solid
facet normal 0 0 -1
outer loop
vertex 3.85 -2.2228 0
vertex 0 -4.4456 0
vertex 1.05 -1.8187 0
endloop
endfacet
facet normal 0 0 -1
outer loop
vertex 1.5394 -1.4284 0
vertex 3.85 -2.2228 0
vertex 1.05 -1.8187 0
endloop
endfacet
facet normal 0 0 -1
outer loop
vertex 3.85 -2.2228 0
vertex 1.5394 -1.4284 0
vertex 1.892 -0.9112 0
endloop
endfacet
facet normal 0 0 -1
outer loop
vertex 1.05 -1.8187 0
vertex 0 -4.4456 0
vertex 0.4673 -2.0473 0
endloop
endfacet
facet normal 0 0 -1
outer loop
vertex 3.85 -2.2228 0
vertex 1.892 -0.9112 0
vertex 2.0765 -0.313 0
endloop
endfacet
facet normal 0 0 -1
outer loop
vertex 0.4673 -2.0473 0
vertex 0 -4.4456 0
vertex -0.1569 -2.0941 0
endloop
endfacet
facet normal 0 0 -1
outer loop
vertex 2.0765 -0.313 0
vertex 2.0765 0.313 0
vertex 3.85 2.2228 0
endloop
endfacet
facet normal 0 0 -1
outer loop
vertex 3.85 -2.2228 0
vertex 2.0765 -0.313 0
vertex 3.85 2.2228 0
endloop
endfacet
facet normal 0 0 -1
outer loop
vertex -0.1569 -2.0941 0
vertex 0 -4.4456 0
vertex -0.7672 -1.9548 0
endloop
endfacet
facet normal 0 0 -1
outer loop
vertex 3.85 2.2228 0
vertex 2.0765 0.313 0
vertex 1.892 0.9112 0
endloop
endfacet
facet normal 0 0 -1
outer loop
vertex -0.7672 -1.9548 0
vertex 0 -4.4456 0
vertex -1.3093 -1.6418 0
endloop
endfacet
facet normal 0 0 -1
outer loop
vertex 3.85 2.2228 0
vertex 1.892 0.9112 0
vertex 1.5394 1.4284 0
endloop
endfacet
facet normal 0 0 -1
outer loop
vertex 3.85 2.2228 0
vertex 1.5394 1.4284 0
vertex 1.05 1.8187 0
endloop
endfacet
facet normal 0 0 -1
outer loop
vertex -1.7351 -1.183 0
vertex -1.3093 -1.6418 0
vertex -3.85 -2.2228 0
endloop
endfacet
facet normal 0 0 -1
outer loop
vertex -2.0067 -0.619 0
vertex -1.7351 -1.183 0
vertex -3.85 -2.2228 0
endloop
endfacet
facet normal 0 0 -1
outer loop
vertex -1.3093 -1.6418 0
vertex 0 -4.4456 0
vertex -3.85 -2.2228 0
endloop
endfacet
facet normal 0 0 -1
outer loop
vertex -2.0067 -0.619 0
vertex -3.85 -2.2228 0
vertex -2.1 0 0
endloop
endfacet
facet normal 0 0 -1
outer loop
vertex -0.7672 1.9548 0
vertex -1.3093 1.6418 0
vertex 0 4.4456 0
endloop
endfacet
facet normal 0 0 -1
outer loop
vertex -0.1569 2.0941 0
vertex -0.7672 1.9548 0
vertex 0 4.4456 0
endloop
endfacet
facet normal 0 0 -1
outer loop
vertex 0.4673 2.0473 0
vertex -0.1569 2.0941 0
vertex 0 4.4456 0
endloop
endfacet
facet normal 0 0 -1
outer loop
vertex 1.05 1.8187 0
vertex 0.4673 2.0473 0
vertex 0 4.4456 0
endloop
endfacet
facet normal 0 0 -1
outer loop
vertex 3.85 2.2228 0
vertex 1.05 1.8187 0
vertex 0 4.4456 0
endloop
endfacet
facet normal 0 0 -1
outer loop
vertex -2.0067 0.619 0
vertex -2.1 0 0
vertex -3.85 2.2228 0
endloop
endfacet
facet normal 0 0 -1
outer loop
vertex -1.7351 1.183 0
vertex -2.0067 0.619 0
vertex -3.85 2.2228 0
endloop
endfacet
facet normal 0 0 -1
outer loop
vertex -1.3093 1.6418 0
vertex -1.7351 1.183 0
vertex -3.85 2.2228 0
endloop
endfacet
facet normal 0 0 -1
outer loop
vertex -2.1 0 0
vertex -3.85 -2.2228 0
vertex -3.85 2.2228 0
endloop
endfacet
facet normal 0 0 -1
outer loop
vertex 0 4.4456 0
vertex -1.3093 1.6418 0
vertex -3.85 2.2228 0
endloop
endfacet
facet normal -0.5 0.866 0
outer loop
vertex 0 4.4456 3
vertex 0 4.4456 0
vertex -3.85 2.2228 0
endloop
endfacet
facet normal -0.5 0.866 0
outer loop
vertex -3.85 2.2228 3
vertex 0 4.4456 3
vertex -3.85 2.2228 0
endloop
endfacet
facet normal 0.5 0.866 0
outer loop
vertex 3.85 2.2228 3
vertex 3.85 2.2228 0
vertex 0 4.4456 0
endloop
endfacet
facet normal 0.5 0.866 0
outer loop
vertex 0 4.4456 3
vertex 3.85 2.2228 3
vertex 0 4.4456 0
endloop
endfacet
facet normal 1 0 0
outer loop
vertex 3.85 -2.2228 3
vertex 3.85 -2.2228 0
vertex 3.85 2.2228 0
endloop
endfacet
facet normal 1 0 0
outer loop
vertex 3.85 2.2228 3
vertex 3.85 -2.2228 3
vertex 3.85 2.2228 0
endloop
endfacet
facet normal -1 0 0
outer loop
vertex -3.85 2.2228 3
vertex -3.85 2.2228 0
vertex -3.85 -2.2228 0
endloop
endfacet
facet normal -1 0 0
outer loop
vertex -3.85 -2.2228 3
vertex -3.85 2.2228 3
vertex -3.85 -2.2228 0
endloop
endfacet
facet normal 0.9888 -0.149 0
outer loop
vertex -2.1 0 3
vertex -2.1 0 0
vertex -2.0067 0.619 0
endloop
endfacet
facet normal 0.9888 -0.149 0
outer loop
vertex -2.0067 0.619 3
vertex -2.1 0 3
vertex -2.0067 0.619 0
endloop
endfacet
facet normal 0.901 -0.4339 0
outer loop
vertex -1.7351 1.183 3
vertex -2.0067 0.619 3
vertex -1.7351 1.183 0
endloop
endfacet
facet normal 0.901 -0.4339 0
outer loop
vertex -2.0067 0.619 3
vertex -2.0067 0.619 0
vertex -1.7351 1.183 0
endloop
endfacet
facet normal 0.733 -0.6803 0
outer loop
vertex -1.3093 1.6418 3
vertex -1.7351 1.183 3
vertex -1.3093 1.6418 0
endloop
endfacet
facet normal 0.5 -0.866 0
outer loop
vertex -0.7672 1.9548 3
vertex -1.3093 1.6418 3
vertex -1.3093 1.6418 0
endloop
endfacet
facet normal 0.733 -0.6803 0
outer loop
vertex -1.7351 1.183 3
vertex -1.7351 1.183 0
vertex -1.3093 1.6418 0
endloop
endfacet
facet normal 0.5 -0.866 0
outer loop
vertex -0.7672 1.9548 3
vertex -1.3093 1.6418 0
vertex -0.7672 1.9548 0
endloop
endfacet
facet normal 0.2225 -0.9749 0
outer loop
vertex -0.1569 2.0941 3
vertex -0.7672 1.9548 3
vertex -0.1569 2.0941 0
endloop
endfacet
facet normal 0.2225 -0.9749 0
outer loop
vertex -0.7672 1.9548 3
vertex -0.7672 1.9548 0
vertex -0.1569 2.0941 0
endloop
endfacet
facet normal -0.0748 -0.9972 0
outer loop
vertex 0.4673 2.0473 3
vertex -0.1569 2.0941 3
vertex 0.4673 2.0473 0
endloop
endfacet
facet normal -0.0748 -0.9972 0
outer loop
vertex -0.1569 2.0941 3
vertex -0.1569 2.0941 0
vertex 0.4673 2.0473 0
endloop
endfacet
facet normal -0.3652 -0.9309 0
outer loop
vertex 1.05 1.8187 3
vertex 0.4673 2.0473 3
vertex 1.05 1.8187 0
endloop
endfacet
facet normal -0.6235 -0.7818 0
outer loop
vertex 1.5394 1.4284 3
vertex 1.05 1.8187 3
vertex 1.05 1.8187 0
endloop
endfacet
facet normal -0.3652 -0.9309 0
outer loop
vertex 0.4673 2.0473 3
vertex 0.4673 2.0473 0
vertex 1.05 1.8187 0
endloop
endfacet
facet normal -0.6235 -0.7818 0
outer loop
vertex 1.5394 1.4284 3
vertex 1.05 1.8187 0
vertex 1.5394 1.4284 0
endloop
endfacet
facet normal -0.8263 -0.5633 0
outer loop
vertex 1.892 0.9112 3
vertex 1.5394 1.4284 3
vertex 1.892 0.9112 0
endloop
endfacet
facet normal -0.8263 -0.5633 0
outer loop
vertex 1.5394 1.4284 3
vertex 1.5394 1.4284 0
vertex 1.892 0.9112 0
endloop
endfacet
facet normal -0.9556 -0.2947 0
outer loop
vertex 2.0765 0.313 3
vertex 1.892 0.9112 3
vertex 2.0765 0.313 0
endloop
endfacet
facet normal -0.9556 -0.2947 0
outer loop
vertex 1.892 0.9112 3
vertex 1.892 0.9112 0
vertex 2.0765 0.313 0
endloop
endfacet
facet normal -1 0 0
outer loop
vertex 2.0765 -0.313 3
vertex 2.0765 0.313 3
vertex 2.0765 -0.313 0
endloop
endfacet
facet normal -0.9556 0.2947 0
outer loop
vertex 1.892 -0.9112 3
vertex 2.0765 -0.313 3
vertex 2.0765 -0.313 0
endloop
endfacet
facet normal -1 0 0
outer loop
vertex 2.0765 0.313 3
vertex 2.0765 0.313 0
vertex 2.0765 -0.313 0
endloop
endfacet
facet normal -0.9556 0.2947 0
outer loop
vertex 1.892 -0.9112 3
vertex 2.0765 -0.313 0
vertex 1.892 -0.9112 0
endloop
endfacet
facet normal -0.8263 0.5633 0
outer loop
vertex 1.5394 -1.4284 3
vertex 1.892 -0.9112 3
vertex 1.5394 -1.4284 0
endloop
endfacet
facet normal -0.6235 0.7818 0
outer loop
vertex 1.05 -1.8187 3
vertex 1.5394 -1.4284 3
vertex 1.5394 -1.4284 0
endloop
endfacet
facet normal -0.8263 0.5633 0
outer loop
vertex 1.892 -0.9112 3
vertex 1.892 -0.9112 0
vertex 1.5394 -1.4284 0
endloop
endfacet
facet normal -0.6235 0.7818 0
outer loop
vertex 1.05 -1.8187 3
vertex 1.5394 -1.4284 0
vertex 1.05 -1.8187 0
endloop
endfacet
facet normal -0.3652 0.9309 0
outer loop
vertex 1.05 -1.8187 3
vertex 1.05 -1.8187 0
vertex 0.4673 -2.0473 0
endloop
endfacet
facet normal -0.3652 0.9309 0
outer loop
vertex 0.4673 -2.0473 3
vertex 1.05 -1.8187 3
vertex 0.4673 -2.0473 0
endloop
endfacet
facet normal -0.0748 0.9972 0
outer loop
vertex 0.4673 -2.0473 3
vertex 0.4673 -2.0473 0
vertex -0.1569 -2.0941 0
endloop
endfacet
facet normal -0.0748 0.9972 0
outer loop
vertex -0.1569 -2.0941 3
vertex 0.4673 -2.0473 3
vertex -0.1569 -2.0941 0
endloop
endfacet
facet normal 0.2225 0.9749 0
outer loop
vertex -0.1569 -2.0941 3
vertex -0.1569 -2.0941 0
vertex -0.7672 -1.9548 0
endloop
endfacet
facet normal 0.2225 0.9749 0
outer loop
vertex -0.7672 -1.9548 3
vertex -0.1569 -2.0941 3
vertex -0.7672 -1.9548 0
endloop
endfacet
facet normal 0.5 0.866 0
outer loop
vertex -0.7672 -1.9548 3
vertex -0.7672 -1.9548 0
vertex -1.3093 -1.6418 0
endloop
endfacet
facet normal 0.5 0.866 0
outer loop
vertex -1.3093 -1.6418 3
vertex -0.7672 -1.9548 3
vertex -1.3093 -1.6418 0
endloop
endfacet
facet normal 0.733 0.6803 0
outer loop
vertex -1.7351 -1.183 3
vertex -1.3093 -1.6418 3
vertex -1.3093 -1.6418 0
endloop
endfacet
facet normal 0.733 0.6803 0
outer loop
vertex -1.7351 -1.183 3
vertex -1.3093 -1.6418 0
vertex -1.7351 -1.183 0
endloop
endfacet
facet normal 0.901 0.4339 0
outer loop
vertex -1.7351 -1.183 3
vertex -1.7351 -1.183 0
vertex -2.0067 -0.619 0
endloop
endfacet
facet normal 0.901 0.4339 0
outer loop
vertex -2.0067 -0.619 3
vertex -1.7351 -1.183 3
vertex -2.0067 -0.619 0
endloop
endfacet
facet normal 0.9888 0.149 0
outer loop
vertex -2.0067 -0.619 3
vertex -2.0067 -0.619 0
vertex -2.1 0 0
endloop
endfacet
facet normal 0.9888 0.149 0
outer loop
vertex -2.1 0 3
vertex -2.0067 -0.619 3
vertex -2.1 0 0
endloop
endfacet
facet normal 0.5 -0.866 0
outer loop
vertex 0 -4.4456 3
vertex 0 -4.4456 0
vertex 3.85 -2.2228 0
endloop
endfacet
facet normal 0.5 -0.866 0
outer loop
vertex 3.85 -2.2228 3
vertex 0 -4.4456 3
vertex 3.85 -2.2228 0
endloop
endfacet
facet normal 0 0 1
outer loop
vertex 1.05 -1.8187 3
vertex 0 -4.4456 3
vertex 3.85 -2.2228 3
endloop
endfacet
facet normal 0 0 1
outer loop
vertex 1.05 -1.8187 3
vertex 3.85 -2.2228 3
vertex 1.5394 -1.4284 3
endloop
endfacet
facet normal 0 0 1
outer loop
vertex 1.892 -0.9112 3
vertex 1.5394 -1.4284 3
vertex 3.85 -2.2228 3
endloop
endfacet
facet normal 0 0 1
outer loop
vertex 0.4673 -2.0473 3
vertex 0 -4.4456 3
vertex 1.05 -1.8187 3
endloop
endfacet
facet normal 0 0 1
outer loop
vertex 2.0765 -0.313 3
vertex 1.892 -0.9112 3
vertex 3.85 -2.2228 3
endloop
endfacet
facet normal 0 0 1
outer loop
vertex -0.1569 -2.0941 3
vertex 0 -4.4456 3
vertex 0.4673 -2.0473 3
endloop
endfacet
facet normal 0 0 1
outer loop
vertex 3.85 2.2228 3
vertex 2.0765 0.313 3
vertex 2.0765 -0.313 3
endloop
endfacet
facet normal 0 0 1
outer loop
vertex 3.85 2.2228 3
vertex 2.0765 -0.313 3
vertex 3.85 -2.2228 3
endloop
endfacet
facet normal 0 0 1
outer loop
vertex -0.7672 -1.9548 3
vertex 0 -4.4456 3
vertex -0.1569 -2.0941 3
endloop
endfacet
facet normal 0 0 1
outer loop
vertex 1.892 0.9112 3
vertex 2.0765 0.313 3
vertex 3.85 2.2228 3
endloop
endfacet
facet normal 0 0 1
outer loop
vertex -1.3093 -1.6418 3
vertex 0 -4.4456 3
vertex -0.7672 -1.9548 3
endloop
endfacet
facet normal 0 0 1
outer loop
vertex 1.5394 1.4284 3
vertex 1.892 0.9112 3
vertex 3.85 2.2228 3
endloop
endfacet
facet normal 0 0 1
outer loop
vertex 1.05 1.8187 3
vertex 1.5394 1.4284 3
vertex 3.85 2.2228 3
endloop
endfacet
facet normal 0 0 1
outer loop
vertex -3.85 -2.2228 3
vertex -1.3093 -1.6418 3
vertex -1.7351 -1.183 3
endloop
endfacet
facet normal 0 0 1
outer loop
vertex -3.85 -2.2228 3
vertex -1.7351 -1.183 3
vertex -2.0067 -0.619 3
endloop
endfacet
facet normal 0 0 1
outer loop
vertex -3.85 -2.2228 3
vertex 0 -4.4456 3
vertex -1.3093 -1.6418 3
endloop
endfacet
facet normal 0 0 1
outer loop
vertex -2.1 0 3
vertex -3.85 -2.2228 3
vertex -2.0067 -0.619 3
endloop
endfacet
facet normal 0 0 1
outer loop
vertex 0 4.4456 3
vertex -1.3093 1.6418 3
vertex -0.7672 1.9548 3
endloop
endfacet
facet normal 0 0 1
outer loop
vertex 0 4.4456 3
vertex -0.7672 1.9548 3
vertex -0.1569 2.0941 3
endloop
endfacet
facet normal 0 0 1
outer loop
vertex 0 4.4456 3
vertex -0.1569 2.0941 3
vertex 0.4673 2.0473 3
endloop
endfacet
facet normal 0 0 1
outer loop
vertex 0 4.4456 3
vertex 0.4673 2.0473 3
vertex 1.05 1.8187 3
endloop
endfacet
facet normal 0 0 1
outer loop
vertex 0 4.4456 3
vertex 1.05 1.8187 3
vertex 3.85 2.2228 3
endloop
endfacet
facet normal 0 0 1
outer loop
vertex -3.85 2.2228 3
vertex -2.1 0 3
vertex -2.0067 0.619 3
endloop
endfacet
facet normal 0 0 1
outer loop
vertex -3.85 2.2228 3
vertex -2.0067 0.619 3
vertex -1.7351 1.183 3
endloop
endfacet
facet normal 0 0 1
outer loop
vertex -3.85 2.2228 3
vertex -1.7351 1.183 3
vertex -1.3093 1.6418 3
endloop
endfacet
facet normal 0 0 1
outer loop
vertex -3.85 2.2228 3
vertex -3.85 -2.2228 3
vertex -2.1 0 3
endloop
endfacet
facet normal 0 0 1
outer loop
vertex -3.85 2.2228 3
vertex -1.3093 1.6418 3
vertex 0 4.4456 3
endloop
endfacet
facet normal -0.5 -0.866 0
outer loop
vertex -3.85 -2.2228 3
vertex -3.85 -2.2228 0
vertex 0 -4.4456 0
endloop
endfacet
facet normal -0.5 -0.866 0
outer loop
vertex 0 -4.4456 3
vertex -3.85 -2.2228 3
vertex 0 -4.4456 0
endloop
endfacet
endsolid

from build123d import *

# Parameters (mm, degrees)
BOSS_EXTRUDE1_DEPTH         = 3
TAP_DRILL_FOR_M5X0_8_TAP1_D = 4.2


with BuildPart() as part:
    # Sketch1 → Boss-Extrude1 (new body)
    with BuildSketch(Plane(origin=(0, 0, 0), x_dir=(0, 1, 0), z_dir=(0, 0, 1))):
        Polygon((-4.445597073, 0), (-2.222798536, -3.85), (2.222798536, -3.85), (4.445597073, 0), (2.222798536, 3.85), (-2.222798536, 3.85), align=None)
    extrude(amount=BOSS_EXTRUDE1_DEPTH)

    # Tap Drill for M5x0.8 Tap1 (through all)
    with Locations(Plane.XY.offset(3)):
        with Locations((0, 0)):
            Hole(TAP_DRILL_FOR_M5X0_8_TAP1_D / 2)


solid = part.part
